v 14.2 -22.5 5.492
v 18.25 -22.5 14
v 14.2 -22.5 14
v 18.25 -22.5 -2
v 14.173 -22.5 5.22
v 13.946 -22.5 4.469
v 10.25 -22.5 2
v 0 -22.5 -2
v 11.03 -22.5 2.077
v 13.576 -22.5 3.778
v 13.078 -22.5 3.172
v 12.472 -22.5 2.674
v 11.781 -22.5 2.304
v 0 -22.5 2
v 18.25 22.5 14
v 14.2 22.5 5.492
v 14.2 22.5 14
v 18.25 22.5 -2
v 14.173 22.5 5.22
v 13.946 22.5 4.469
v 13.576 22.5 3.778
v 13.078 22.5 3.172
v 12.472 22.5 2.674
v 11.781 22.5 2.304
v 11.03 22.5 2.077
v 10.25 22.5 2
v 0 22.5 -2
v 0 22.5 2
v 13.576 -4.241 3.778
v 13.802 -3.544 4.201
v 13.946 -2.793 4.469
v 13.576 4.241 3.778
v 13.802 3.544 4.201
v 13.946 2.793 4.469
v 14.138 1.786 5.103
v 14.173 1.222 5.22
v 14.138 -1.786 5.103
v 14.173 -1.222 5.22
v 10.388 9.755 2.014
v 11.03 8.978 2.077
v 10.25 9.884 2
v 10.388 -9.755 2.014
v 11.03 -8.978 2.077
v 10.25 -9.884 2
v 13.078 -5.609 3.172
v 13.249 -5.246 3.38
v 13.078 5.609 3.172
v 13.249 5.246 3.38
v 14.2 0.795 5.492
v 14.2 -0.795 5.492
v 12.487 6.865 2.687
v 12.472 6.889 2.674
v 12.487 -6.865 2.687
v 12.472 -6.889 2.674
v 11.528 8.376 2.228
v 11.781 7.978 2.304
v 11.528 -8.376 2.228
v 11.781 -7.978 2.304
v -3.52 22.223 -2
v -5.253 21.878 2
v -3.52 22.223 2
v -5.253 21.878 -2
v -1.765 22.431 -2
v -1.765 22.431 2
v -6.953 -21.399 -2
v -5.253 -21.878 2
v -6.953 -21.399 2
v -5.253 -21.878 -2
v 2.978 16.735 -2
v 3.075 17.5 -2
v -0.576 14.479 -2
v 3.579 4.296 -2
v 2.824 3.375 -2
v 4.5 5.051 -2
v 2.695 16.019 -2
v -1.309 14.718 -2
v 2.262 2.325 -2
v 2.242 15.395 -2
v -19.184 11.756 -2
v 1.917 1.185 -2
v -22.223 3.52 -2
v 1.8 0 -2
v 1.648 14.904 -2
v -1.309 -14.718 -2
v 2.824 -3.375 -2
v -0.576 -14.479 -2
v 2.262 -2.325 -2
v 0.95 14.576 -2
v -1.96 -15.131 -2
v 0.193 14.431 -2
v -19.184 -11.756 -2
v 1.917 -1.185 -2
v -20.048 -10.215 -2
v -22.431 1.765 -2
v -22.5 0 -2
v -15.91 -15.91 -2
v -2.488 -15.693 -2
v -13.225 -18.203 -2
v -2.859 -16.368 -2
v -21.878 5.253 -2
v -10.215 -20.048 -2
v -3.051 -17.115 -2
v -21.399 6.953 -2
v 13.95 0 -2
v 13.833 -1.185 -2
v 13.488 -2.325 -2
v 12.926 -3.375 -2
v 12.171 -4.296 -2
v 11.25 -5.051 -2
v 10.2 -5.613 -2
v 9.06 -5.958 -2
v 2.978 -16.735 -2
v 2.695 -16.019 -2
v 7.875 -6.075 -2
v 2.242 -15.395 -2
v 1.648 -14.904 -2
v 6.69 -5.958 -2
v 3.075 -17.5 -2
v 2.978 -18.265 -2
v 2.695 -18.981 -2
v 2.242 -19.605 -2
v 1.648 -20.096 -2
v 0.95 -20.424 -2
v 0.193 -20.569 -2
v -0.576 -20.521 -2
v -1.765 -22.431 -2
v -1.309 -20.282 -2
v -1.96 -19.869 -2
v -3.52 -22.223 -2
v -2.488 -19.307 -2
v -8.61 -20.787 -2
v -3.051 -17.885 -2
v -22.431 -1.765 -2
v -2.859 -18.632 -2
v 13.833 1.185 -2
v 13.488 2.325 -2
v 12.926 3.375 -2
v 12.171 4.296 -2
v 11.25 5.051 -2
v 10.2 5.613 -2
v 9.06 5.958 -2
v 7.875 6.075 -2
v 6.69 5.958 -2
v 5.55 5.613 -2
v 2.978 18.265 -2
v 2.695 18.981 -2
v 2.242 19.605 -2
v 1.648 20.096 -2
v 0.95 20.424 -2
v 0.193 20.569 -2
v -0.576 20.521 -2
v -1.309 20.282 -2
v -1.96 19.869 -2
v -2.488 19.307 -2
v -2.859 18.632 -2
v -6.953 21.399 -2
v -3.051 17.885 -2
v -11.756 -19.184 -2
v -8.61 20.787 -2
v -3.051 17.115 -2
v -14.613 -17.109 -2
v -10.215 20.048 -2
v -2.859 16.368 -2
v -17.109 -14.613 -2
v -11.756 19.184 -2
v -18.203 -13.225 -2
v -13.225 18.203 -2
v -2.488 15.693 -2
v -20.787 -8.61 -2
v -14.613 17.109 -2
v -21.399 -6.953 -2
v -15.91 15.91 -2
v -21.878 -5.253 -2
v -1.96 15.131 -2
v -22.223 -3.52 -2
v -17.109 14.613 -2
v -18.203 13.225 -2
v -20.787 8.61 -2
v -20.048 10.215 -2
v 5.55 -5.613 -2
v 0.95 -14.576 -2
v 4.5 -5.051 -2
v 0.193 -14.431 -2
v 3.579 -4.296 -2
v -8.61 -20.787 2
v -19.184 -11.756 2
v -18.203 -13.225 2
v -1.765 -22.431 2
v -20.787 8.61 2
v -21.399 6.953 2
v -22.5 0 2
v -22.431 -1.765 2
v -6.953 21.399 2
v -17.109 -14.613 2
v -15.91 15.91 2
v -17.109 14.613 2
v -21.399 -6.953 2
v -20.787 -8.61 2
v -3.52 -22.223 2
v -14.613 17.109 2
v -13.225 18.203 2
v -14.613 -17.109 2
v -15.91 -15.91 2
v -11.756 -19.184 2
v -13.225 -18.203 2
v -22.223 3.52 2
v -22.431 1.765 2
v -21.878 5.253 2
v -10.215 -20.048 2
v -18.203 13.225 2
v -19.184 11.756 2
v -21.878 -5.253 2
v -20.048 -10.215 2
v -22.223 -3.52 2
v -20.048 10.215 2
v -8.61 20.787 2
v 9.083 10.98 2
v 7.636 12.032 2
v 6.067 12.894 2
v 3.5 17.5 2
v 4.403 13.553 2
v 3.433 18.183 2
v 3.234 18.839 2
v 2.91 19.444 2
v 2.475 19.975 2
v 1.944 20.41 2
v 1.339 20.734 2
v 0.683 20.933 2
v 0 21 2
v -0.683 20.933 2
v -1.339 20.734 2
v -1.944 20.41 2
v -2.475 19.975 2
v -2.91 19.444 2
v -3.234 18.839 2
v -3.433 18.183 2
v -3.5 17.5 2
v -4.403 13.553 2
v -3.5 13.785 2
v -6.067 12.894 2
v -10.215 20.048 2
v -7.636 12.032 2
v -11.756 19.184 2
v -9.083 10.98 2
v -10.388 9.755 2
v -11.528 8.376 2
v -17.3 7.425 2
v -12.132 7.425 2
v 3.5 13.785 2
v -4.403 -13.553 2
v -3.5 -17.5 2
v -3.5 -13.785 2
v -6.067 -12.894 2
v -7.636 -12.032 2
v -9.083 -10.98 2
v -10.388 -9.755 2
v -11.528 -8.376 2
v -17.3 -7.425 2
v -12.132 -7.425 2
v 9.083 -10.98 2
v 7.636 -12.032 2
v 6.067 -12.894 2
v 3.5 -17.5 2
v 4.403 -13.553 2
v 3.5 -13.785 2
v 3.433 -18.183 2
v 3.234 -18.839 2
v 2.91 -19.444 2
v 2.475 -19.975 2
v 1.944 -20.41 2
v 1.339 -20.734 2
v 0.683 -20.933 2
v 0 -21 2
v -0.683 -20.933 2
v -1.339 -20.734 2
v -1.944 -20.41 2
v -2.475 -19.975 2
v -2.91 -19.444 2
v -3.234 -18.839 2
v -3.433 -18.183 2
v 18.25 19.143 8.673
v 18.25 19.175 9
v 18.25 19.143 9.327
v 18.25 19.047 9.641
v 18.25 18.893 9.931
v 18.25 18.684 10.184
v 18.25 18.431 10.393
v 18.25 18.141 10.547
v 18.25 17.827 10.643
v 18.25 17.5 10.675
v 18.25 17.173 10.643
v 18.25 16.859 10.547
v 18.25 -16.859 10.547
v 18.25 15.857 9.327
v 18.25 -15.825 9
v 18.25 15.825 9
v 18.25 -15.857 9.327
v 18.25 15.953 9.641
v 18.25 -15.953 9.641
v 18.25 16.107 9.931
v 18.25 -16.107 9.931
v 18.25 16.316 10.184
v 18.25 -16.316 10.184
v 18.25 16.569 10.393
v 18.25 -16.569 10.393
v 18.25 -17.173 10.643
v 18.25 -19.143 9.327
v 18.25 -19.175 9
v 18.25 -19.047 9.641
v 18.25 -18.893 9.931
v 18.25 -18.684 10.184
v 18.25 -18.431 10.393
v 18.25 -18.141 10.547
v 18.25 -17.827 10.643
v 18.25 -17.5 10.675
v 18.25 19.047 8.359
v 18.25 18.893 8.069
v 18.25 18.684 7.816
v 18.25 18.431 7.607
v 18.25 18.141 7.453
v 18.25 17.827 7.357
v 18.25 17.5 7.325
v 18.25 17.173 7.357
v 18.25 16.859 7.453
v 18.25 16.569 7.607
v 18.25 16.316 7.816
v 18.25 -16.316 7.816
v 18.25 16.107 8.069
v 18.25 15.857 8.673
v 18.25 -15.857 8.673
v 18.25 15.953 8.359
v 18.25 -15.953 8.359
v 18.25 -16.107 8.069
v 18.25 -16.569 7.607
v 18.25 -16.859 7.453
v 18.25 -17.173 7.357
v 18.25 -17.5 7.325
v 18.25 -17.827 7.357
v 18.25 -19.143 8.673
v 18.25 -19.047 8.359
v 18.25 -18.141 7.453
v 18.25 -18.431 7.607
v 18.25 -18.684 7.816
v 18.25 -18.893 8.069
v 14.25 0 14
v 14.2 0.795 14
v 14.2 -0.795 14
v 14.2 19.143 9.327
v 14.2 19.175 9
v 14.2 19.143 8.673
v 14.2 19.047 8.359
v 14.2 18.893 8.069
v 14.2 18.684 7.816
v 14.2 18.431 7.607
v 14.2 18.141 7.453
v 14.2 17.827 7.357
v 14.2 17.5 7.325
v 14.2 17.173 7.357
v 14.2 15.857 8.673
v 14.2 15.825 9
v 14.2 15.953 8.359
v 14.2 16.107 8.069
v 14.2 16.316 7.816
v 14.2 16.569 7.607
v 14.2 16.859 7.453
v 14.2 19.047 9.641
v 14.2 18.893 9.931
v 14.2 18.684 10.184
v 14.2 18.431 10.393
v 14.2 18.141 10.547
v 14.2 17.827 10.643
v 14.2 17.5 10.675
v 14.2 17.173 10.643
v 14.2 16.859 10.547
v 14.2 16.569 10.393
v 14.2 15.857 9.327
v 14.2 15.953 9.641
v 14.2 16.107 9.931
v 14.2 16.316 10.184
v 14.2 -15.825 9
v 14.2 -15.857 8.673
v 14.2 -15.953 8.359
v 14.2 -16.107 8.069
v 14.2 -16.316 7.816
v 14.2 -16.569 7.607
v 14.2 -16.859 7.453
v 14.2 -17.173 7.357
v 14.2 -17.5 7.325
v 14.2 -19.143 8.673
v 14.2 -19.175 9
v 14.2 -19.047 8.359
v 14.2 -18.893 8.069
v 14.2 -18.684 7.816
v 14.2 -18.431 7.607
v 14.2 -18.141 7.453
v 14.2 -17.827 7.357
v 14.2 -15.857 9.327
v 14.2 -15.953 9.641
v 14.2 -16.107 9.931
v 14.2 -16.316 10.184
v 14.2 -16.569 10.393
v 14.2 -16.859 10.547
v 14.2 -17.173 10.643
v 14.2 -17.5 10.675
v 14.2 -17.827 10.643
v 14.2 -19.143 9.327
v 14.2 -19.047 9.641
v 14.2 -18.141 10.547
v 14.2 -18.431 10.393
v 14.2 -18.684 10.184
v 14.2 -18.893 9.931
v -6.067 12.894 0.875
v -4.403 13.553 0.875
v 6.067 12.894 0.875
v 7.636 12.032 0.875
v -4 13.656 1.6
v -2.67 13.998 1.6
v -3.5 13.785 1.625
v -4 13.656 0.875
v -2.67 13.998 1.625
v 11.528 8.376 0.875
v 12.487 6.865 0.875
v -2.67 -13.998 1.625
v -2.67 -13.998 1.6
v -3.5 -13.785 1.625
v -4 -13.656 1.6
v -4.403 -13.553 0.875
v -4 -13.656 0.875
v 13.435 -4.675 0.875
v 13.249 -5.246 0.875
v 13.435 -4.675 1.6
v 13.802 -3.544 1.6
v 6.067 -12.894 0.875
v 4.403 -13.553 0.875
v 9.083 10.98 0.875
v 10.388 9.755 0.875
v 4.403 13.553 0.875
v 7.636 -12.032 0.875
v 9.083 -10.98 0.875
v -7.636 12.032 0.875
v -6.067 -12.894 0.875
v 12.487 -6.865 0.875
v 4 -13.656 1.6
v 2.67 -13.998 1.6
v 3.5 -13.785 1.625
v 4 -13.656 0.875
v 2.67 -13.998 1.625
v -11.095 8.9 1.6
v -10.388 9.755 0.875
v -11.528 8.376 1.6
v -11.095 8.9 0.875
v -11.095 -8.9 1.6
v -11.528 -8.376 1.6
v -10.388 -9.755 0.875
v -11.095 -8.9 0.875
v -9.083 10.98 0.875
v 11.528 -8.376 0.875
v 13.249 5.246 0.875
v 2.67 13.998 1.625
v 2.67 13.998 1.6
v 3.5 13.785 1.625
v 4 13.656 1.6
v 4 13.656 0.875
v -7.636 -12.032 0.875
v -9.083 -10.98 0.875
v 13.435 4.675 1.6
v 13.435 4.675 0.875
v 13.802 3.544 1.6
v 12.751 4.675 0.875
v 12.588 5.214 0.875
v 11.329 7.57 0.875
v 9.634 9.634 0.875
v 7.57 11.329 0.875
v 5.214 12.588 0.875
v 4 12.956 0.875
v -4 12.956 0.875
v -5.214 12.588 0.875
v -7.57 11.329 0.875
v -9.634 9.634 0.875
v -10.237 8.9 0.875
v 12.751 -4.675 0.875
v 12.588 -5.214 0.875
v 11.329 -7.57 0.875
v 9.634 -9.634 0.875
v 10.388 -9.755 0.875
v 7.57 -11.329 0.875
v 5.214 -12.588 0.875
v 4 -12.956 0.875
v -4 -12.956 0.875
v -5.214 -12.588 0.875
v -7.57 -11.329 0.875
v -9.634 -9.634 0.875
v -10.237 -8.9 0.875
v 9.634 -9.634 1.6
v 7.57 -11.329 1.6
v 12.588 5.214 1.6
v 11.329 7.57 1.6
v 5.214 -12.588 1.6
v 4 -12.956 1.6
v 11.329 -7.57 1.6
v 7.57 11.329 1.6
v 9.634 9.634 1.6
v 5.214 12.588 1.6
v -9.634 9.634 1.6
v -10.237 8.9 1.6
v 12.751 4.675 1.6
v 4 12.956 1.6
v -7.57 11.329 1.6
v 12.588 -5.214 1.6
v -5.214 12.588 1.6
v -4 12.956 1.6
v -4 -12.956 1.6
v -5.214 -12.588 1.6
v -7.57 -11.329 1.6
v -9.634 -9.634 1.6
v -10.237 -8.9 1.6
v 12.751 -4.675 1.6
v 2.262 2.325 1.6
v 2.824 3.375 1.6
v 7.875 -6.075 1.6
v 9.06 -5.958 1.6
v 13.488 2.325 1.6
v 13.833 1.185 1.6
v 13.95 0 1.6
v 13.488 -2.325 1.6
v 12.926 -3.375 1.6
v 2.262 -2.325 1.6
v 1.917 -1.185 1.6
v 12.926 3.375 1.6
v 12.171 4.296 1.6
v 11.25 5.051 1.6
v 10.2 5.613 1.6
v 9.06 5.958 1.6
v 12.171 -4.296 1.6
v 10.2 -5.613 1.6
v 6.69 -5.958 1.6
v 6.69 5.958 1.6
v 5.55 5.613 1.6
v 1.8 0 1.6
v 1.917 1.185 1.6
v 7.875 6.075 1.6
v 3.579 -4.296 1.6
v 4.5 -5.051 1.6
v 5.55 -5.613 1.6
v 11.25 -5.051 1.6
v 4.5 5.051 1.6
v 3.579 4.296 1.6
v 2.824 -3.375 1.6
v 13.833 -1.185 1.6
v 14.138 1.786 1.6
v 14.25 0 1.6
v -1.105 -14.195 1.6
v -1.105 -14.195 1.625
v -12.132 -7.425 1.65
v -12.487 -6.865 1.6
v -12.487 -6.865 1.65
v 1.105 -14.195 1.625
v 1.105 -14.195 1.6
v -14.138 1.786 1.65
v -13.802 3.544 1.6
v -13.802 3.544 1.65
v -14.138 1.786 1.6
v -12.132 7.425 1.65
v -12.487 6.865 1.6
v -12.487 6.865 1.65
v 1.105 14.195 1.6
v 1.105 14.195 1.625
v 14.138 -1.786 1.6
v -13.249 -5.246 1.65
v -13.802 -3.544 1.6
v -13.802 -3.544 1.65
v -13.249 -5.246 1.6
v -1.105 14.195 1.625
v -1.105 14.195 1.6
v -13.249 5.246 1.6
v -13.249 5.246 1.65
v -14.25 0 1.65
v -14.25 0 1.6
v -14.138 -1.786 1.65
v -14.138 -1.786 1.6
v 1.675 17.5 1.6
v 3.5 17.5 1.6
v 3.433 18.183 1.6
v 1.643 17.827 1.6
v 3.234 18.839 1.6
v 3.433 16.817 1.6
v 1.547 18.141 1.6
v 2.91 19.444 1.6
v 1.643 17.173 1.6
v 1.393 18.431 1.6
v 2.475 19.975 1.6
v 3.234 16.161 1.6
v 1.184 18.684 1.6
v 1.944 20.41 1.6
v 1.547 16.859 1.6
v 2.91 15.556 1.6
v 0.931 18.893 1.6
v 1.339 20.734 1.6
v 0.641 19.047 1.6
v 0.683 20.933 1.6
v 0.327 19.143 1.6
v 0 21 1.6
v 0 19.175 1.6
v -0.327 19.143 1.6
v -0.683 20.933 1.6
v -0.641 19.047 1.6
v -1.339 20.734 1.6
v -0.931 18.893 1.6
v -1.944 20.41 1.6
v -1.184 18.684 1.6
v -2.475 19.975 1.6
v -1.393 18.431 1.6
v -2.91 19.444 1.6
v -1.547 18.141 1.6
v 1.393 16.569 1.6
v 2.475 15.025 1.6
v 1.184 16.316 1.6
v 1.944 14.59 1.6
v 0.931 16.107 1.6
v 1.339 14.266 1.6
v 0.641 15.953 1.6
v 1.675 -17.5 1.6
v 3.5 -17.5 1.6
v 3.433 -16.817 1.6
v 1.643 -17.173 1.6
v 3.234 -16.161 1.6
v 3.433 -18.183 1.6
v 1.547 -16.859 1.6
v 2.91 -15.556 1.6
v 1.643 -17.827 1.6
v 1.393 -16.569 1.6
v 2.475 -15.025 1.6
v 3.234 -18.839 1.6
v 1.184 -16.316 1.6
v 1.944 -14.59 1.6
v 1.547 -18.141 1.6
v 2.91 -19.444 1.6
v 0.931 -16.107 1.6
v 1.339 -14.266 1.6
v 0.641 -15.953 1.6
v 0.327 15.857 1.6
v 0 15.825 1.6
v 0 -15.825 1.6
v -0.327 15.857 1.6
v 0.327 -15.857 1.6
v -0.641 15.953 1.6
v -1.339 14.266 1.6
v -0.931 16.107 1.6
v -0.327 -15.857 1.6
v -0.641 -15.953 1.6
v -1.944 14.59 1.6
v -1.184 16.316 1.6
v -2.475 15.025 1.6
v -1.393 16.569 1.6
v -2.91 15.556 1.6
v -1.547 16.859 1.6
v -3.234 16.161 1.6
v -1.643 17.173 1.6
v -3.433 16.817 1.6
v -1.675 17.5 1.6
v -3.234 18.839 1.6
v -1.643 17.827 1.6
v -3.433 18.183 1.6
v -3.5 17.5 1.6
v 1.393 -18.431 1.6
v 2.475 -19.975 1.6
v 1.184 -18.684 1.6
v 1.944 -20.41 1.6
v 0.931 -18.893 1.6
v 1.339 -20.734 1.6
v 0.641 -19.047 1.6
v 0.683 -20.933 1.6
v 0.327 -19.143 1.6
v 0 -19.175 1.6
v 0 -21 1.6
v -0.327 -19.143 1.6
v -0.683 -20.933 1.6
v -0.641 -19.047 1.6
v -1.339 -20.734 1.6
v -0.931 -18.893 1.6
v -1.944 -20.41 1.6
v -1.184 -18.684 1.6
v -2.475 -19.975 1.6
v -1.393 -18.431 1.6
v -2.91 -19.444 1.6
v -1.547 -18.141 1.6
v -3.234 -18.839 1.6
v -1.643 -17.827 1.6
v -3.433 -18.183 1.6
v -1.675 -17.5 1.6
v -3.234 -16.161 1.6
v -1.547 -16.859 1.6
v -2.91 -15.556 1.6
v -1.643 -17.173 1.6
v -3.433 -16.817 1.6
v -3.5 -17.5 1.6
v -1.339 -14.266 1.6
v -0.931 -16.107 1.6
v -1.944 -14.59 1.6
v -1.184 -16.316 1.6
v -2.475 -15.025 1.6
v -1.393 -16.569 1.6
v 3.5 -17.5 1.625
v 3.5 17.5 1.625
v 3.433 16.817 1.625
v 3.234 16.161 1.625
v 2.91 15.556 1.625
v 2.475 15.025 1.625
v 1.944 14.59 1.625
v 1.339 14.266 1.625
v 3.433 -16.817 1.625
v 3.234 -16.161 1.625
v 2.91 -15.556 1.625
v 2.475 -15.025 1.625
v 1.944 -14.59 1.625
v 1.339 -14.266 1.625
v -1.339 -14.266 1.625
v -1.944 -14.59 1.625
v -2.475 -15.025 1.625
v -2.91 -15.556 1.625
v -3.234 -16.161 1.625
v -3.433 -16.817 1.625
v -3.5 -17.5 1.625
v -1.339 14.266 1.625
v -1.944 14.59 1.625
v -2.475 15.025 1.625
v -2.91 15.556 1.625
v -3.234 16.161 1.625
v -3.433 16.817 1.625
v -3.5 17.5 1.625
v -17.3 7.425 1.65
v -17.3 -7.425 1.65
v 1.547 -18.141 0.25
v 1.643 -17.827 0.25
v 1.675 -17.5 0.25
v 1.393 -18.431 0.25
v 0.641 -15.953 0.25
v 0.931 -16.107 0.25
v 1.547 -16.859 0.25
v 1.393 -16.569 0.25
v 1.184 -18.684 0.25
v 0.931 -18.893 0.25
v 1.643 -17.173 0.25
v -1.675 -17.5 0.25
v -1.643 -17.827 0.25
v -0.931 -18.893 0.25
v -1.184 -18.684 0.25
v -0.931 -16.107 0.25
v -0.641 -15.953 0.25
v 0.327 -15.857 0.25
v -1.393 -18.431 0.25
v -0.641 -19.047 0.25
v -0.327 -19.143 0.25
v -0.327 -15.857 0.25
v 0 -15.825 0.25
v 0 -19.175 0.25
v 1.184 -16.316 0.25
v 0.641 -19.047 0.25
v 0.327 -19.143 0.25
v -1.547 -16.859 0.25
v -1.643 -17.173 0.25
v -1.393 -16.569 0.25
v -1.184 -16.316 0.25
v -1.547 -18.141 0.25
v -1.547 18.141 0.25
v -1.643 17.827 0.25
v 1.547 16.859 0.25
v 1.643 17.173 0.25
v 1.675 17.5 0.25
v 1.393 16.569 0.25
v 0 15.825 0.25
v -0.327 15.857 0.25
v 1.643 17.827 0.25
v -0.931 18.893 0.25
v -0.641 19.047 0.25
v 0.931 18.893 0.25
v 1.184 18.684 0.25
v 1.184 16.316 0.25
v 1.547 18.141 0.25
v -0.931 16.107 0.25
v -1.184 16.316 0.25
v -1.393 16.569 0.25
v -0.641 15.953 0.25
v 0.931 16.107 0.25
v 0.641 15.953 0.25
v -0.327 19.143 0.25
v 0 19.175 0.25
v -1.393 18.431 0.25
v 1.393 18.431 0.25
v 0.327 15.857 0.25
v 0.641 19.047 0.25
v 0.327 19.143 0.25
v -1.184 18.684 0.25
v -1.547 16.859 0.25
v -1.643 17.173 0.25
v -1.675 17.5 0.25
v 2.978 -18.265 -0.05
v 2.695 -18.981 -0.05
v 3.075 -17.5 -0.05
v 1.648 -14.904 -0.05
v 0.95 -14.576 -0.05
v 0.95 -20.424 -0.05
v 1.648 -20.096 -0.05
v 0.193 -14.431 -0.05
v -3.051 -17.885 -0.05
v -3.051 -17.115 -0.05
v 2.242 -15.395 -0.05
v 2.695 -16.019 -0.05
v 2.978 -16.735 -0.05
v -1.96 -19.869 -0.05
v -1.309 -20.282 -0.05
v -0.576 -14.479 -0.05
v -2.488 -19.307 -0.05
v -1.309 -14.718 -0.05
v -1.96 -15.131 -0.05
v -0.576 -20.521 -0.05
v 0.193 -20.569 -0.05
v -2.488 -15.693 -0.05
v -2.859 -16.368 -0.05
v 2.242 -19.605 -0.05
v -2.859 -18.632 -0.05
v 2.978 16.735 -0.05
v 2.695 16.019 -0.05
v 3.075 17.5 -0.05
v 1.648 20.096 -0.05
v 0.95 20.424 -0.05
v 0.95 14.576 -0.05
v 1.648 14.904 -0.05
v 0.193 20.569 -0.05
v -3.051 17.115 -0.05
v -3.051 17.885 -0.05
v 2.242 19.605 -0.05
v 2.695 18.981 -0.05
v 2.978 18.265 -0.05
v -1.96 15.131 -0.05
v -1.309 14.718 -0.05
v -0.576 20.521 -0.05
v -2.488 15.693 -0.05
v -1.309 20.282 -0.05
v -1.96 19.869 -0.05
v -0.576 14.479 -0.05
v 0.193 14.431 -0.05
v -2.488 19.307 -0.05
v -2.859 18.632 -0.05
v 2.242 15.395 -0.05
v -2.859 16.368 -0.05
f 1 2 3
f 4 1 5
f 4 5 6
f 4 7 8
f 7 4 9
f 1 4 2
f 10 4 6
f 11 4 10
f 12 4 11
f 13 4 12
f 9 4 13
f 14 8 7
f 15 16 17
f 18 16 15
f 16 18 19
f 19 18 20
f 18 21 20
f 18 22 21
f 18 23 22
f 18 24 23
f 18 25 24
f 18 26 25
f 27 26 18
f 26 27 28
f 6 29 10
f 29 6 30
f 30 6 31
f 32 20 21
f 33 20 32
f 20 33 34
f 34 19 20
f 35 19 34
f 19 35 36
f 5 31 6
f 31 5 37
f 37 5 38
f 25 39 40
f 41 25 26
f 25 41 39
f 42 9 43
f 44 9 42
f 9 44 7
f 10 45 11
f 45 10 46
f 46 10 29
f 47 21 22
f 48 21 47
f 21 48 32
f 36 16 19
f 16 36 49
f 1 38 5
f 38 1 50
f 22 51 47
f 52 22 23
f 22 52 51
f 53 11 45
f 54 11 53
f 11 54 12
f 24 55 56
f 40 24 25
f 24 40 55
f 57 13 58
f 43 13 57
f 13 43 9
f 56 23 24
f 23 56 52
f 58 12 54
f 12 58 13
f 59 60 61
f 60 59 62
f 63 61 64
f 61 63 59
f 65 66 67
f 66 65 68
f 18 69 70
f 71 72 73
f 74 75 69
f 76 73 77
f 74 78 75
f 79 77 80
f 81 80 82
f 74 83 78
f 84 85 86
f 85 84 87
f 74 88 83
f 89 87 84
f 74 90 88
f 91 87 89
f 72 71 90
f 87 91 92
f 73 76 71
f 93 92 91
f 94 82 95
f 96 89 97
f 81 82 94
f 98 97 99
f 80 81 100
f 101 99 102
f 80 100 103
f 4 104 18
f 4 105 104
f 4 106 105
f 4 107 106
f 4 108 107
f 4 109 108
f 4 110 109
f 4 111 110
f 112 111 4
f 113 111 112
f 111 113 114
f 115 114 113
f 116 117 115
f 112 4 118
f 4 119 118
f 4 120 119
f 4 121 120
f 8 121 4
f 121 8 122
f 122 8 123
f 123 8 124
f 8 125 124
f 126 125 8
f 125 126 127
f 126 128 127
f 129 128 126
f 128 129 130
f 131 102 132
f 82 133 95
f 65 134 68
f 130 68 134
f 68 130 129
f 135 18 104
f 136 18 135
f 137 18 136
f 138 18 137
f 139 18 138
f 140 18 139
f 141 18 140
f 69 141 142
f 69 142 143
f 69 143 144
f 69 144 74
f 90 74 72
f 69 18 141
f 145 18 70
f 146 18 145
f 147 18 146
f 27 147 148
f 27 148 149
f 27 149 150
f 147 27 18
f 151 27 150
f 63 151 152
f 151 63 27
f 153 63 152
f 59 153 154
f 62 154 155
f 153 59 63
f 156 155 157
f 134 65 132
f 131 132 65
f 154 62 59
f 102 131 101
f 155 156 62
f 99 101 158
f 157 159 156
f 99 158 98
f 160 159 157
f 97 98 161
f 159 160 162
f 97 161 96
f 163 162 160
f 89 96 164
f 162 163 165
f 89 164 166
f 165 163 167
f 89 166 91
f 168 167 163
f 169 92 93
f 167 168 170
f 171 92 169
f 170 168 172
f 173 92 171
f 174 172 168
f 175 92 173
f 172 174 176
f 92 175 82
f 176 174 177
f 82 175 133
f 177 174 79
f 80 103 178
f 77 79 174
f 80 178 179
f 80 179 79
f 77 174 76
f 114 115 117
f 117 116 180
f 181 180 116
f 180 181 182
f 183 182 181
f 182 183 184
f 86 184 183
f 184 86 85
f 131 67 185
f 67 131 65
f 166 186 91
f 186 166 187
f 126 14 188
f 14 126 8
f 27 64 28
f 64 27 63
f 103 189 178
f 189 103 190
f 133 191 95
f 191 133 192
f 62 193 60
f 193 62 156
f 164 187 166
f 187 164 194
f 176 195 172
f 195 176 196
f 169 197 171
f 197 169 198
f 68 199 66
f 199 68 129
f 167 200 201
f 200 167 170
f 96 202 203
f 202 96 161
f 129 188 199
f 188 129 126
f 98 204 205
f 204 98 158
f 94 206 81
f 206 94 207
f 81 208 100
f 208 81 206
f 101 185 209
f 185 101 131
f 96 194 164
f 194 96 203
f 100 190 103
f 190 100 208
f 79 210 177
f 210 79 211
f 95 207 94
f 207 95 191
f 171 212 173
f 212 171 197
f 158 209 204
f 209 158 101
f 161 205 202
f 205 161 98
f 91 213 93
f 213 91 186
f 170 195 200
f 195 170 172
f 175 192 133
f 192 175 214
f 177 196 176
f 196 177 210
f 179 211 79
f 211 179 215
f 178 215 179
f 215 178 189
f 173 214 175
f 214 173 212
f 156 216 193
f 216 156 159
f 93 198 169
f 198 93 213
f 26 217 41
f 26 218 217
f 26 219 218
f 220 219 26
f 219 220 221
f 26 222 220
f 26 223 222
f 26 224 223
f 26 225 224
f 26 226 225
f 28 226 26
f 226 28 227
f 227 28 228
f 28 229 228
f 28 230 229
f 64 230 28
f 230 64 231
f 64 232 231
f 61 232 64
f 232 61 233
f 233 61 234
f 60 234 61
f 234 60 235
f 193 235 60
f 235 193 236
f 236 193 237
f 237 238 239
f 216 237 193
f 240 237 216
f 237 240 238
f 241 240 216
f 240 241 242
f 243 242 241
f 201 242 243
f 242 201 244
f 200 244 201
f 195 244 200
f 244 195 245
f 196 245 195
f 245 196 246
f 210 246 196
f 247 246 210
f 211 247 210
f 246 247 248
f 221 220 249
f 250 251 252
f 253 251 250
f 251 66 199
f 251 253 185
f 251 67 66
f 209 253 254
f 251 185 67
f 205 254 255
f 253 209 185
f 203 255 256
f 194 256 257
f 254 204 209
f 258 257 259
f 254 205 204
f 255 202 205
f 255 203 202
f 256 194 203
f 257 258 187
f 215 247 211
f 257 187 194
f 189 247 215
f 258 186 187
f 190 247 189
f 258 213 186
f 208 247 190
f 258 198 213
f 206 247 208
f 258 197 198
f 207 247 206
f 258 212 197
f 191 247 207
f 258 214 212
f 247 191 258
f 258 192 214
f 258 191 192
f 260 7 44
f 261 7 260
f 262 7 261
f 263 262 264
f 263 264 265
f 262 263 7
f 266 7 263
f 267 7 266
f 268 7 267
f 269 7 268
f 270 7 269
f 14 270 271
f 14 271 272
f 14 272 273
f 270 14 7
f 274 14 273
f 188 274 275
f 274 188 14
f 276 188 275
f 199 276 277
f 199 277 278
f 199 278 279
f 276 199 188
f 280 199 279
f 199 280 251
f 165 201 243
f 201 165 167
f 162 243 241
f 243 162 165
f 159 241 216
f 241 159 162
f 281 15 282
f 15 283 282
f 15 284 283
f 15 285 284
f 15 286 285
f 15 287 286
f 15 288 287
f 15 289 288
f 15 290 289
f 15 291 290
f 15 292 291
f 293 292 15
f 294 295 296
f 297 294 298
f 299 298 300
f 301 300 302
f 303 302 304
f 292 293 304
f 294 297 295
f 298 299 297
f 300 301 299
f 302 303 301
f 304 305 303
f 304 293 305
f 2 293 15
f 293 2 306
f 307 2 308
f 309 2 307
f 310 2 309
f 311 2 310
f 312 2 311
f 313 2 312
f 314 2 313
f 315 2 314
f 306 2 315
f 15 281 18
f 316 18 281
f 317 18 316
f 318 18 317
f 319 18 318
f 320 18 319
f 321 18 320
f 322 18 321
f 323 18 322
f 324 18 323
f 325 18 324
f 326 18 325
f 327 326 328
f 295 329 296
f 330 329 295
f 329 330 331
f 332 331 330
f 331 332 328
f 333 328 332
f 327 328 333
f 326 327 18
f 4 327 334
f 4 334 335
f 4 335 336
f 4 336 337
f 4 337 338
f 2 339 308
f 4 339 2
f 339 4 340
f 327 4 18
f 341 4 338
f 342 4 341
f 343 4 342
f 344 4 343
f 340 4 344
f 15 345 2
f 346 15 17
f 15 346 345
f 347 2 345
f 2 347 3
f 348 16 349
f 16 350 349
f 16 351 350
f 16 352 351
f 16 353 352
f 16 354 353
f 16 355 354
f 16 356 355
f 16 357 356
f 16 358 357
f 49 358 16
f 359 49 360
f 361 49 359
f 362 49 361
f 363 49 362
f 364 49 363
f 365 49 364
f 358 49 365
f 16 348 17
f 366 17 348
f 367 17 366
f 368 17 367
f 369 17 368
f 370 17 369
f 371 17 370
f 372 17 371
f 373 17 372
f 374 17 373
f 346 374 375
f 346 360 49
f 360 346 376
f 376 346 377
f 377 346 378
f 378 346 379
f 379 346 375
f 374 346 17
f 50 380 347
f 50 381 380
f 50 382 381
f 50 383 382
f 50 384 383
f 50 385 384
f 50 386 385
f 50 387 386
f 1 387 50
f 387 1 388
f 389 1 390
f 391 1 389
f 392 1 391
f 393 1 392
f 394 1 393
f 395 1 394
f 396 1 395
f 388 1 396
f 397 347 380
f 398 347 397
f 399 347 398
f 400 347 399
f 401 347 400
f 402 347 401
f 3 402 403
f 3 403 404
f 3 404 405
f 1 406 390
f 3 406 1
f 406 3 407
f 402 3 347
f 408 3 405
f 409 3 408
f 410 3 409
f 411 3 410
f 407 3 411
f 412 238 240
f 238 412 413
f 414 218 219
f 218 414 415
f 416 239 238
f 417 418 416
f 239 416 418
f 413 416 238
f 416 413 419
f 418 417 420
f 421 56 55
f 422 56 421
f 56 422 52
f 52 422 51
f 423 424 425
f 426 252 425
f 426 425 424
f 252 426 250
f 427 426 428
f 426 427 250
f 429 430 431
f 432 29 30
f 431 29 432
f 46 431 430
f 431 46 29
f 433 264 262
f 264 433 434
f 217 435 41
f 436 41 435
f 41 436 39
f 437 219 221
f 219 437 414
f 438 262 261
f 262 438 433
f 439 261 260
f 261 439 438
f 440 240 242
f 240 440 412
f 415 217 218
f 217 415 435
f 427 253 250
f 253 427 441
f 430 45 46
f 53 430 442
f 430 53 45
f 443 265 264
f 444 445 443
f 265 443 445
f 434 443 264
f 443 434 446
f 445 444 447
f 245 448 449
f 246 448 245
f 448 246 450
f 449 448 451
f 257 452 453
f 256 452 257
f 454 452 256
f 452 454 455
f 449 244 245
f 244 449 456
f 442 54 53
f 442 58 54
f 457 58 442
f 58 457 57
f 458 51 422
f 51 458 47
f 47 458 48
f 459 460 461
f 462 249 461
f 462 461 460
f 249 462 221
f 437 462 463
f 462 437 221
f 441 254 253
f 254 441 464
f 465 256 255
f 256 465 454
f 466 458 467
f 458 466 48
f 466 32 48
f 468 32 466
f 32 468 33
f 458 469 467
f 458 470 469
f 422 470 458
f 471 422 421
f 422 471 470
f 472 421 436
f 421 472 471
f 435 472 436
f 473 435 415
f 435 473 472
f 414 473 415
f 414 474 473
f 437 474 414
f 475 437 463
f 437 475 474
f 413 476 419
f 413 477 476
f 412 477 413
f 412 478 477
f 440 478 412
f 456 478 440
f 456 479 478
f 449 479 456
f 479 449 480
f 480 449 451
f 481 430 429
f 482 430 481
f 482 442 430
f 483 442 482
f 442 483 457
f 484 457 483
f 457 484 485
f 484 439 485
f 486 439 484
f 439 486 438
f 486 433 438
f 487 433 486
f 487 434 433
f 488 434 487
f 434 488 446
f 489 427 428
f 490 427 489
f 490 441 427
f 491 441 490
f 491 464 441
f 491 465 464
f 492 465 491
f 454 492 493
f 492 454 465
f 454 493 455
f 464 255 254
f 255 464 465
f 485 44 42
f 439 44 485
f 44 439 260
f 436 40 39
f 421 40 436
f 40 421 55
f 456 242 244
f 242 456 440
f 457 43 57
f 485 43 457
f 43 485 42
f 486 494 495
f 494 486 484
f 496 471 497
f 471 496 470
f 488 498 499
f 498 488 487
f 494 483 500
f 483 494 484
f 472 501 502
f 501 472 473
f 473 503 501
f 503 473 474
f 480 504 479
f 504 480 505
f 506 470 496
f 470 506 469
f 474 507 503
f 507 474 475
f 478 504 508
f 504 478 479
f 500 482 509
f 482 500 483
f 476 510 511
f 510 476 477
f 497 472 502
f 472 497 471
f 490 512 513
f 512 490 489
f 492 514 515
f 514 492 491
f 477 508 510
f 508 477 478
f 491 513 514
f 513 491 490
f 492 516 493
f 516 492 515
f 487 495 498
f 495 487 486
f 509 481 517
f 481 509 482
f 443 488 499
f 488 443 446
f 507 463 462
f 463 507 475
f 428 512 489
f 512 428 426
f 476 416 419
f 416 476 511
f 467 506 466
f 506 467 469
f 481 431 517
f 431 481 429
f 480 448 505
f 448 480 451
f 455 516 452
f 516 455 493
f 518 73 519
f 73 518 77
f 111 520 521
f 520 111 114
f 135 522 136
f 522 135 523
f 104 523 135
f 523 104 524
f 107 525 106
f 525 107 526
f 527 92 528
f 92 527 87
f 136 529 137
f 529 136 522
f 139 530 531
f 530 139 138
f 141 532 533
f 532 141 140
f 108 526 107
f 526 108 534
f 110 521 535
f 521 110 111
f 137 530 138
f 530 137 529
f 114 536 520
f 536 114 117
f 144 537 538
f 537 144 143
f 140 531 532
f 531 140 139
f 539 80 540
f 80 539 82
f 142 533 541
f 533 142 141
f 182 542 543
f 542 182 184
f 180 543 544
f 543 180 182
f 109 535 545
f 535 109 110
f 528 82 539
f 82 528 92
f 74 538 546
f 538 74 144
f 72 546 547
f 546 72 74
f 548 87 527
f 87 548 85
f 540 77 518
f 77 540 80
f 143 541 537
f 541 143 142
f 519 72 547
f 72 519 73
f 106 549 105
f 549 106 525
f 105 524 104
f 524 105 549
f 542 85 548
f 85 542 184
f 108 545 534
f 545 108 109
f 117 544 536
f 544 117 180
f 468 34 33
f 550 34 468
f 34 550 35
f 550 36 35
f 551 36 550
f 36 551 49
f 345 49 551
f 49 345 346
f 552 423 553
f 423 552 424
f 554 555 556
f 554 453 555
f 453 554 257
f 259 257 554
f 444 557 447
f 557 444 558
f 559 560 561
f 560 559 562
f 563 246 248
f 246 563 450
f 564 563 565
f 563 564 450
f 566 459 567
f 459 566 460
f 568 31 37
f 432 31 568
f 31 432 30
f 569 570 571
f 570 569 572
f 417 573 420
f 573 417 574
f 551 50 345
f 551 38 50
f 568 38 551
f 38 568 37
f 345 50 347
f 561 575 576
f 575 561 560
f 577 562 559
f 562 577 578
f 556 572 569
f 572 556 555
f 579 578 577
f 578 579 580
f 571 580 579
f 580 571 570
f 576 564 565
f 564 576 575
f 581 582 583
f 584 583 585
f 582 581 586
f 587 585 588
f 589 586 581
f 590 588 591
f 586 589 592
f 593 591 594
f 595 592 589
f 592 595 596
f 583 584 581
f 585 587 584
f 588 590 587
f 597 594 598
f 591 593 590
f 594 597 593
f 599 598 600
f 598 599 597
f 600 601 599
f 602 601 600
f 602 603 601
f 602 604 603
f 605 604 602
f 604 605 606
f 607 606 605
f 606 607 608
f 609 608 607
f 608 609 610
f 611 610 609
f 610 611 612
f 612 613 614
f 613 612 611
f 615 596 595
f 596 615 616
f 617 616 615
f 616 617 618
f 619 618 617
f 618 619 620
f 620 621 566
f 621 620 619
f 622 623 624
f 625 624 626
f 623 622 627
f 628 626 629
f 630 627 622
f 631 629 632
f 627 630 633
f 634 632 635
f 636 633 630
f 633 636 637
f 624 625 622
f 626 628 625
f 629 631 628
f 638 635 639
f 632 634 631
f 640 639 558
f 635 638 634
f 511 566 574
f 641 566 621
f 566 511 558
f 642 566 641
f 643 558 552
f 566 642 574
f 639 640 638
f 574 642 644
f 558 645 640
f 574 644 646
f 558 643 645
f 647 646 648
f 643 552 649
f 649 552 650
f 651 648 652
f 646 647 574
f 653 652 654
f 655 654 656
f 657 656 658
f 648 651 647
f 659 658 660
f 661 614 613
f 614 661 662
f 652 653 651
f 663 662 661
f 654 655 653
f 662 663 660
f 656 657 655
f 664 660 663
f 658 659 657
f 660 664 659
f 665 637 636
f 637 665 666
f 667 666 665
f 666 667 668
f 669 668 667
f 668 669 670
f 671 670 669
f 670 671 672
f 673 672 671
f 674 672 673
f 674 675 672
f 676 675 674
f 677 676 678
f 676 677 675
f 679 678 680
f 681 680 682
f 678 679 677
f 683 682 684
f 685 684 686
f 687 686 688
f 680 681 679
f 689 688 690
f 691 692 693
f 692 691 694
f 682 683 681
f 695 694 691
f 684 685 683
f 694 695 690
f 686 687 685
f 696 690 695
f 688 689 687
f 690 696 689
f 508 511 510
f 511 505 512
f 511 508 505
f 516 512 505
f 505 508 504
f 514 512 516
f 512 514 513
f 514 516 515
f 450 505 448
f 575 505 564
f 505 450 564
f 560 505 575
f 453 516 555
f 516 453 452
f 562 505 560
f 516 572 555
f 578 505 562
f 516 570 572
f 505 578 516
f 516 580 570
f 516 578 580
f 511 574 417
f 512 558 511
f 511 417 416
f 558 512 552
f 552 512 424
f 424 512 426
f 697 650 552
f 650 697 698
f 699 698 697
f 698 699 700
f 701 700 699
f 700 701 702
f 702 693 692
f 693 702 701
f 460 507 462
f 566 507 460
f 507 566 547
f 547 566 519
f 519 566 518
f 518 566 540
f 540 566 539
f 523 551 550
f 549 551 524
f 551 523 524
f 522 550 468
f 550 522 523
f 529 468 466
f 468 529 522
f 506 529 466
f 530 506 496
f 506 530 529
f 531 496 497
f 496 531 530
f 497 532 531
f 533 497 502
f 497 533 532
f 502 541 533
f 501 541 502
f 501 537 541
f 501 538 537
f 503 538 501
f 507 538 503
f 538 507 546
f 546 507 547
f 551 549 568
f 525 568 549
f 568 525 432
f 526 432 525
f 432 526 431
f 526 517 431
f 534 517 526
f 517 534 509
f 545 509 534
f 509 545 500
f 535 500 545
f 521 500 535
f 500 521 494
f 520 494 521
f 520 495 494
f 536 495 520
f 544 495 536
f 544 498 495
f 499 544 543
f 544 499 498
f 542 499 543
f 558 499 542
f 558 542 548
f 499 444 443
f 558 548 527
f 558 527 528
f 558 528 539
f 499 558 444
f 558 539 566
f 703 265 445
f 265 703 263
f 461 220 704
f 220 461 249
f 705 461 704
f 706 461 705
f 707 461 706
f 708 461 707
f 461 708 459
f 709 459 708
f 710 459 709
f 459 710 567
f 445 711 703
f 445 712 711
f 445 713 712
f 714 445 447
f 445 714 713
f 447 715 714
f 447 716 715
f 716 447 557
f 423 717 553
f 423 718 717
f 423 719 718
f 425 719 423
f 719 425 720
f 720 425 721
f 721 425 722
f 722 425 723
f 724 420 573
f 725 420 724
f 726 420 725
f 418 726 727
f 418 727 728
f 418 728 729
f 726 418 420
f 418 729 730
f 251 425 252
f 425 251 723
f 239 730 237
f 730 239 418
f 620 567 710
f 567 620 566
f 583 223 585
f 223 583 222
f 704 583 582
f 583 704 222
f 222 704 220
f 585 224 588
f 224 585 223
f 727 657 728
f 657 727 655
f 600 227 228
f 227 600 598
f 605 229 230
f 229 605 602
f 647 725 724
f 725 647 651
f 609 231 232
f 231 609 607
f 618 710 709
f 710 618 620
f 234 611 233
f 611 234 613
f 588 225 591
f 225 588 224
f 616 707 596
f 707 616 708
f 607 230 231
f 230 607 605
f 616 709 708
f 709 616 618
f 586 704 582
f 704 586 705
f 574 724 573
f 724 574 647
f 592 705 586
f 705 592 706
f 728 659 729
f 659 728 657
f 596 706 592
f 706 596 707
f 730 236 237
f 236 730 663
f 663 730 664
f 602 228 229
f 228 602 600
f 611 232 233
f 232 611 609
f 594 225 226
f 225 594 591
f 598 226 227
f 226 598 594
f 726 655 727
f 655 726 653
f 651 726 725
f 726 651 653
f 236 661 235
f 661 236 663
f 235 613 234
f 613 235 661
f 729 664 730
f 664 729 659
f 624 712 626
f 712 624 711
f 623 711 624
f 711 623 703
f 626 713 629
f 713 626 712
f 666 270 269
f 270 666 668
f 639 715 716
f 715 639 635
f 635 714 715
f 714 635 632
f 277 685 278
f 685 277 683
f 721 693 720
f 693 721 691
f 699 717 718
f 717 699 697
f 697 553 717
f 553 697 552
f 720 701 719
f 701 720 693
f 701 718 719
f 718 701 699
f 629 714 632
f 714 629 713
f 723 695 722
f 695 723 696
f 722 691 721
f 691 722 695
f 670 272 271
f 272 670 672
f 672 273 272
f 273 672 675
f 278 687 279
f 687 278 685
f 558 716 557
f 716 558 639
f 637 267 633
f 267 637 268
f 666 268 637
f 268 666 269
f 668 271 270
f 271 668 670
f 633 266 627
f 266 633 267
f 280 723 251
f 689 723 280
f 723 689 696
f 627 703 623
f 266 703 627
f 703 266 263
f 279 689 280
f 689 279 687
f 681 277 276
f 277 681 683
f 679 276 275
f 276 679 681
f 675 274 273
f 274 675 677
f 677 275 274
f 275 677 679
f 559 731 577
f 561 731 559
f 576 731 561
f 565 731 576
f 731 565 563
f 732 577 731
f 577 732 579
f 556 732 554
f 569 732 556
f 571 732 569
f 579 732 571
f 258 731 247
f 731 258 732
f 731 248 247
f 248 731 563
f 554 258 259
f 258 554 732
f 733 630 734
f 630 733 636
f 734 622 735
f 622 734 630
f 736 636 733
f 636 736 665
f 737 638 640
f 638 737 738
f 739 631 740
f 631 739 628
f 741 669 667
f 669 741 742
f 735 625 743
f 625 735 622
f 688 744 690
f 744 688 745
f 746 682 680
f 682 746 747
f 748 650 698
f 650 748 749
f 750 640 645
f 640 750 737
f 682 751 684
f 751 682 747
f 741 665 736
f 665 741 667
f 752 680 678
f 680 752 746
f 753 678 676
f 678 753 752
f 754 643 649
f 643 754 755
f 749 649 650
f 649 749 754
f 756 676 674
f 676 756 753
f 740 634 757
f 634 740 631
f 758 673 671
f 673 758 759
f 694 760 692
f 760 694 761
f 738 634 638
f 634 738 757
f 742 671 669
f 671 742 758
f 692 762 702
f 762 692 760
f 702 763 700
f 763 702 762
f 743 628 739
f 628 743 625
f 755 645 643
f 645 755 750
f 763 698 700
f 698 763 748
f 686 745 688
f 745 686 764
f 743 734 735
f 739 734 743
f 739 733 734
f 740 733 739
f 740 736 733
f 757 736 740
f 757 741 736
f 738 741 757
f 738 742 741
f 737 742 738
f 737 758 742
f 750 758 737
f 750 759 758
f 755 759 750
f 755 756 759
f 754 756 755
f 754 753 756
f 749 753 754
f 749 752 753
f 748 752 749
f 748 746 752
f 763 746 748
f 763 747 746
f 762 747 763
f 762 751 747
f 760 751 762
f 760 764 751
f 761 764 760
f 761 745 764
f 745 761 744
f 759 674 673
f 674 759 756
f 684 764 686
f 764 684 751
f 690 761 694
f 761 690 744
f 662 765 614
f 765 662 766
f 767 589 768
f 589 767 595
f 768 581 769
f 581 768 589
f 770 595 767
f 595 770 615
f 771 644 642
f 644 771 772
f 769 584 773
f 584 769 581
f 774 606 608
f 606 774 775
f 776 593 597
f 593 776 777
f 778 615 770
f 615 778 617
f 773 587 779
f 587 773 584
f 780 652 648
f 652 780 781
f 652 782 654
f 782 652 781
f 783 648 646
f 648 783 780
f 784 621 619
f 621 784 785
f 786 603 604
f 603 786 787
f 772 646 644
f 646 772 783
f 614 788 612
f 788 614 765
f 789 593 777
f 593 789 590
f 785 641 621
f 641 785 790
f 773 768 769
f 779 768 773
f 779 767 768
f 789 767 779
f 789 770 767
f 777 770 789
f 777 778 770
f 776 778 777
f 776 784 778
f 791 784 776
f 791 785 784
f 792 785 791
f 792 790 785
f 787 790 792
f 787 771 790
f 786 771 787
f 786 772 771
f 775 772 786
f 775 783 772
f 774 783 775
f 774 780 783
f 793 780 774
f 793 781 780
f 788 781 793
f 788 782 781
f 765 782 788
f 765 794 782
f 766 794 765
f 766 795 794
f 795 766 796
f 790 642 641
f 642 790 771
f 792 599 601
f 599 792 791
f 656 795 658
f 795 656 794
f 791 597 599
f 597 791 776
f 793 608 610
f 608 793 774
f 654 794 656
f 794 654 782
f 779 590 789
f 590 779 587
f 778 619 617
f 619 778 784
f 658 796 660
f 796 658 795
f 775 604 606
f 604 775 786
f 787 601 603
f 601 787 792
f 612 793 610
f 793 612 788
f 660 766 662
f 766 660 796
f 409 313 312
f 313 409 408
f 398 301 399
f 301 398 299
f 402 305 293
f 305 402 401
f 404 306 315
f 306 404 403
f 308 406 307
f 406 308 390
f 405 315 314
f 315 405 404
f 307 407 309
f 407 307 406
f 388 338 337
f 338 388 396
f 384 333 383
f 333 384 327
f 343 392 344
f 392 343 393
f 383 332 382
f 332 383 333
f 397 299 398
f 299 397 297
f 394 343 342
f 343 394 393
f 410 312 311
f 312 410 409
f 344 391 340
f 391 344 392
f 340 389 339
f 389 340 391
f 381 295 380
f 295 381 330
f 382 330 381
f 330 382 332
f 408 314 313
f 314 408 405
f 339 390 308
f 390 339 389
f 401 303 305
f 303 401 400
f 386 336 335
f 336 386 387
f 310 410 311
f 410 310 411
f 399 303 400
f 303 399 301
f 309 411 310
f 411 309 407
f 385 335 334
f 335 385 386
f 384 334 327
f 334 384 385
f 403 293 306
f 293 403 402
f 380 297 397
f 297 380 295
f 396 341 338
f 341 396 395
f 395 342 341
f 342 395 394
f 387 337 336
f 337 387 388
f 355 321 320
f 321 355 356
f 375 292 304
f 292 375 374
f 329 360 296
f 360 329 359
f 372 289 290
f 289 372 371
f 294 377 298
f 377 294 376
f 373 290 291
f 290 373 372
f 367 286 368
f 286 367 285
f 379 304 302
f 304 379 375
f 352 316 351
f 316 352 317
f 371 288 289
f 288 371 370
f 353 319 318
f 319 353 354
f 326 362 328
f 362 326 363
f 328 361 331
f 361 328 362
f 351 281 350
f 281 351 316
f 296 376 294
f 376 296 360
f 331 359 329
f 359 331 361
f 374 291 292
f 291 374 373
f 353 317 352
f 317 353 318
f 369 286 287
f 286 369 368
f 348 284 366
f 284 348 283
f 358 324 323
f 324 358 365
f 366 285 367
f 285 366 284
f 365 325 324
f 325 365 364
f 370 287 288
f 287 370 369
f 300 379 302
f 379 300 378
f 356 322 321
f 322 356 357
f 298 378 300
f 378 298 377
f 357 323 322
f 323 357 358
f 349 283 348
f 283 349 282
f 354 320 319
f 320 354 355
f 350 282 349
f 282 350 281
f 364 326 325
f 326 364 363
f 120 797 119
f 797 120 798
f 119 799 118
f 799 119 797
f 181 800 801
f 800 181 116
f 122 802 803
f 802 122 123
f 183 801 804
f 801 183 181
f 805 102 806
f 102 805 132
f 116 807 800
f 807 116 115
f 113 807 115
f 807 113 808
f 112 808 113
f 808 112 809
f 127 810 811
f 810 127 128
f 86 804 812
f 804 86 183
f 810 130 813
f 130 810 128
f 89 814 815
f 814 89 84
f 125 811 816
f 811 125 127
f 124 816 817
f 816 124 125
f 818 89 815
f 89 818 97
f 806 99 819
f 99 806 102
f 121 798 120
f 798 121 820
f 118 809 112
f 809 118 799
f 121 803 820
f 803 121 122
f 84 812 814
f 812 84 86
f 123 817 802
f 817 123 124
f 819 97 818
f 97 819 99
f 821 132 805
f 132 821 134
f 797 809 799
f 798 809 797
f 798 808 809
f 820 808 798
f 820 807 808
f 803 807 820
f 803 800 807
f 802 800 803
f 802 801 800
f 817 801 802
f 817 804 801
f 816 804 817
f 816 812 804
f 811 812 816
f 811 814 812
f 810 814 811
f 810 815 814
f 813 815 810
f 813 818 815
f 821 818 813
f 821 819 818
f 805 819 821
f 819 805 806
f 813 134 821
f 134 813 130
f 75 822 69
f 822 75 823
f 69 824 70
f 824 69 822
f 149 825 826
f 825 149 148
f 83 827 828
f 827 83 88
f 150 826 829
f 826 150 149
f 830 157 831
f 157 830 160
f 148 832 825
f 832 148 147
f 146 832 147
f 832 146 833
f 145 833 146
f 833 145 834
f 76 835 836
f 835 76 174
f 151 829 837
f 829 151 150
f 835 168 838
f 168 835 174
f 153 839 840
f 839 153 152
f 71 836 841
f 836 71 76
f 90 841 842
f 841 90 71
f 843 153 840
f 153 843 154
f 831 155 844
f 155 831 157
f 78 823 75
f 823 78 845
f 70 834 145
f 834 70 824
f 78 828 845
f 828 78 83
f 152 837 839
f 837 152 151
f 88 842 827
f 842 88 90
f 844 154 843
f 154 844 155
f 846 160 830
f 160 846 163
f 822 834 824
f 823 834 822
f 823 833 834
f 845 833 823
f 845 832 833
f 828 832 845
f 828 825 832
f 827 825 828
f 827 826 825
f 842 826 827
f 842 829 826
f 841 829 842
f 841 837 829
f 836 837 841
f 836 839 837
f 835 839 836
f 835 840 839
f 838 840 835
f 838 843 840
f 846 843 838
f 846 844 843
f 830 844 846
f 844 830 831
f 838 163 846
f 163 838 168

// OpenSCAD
// Bracket for  28BYJ-48 stepper motor
// 28BYJ-48 model from RGriffoGoes www.thingiverse.com/thing:204734
// added details by J.Beale 21 July 2014
// Bracket by J.Beale 9 Aug 2014

slop = 0.25;  // printer tolerance
layer = 0.25; // layer height

// =========================================================
// stepper motor body model

MBH = 18.8;   // motor body height
MBD = 28.25+slop;  // motor body OD
SBD = 9.1+slop;    // shaft boss OD
SBH = 1.45;   // shaft boss height above motor body
SBO = 7.875;  // offset of shaft/boss center from motor center
//SHD = 4.93+slop*2;   // motor shaft OD+ countersink for boss
SHD = 11.9+slop;   // motor shaft OD (larger clearance hole)
SHDF = 3.0;   // motor shaft diameter, across flats
SHHF = 6.0;   // motor shaft flats height, or depth in from end
SHHF = 0.0;   // assume round shaft for purposes of bracket
SHH = 9.75;   // height of shaft above motor body 

MBFH = 0.7;   // height of body edge flange protruding above surface
MBFW = 1.0+slop;   // width of edge flange
MBFNW = 8;    // width of notch in edge flange
MBFNW2 = 17.8;  // width of edge flange notch above wiring box

MHCC = 35.0;  // mounting hole center-to-center
MTH  = 0.8;   // mounting tab thickness
MTW  = 7.0;   // mounting tab width
// MTHID = 4.0;  // mounting tab hole inner diameter
MTHID = 3.0;  // mounting tab hole inner diameter
WBH  = 16.7;  // plastic wiring box height
WBW  = 14.6+slop;  // plastic wiring box width
WBD  = 31.3+slop;  // body diameter to outer surface of wiring box

WRD = 1.0;     // diameter of electrical wires
WRL = 30;      // length of electrical wires
WRO = 2.2;		// offset of wires below top motor surface
// =========================================================
// right-angle bracket for motor

MSOD = 5.9 + slop;  // M3 mounting screw head diameter
MSTH = 2.0;  // M3 screw head thickness (for countersink)
//MSTH = 0; // set to zero for no screwhead countersink
MSSD = 3.1 + slop;  // M3 screw diameter clearance hole
Bthick = 4;  // thickness of bracket
Bdia = (MHCC+10);  // diameter of bracket face

// =========================================================
fn = 80;
eps = 0.05;   // small number to avoid coincident faces


module StepMotor28BYJ()
{
  difference(){
    union(){
	   color("gray") translate([0,0,-(MBH+MBFH)/2])
		  difference() {  // flange at top rim
         cylinder(h = MBFH+eps, r = MBD/2, center = true, $fn = 50);
         cylinder(h = MBFH+2*eps, r = (MBD-MBFW)/2, center = true, $fn = 32);
			cube([MBFNW,MHCC,MBFH*2],center=true); // notches in rim
			cube([MBD+2*MBFW,SBD,MBFH*2],center=true);
		   translate([-MBD/2,0,0]) cube([MBD,MBFNW2,MBFH*2],center=true);
        }
		color("gray") // motor body
			cylinder(h = MBH, r = MBD/2, center = true, $fn = 50);
		color("gray") translate([SBO,0,-SBH])	// shaft boss
			cylinder(h = MBH, r = SBD/2, center = true, $fn = 32);

		translate([SBO,0,-SHH])	// motor shaft
        difference() {
			color("gold") cylinder(h = MBH, r = SHD/2, center = true, $fn = 32);
				// shaft flats
		   color("red") translate([(SHD+SHDF)/2,0,-(eps+MBH-SHHF)/2]) 
				cube([SHD,SHD,SHHF], center = true);
		   color("red") translate([-(SHD+SHDF)/2,0,-(eps+MBH-SHHF)/2]) 
				cube([SHD,SHD,SHHF], center = true);
        }


		color("Silver") translate([0,0,-(MBH-MTH-eps)/2]) // mounting tab 
			cube([MTW,MHCC,MTH], center = true);				
		color("Silver") translate([0,MHCC/2,-(MBH-MTH)/2]) // mt.tab rounded end
			cylinder(h = MTH, r = MTW/2, center = true, $fn = 32);
		color("Silver") translate([0,-MHCC/2,-(MBH-MTH)/2]) // mt.tab rounded end
			cylinder(h = MTH, r = MTW/2, center = true, $fn = 32);


		color("blue") translate([-(WBD-MBD),0,eps-(MBH-WBH)/2]) // plastic wire box
			cube([MBD,WBW,WBH], center = true);
	   color("blue") translate([-2,0,0])	
			cube([24.5,16,15], center = true);
		}

				// mounting holes in tabs on side
		color("red") translate([0,MHCC/2,-MBH/2])	
				cylinder(h = 2, r = MTHID/2, center = true, $fn = 32);
		color("red") translate([0,-MHCC/2,-MBH/2])	
				cylinder(h = 2, r = MTHID/2, center = true, $fn = 32);
		}
}

module MOT() {
 translate([0,0,-MBH/2]) 
 rotate([180,0,0]) StepMotor28BYJ();  // motor body (without wires)
}


module bracket() {
difference() {
 union() {
  translate([0,0,-2]) cylinder(h=Bthick, r=Bdia/2, $fn=fn);  // round face
  translate([-eps + MBD/2,-Bdia/2,-16+Bthick/2]) 
		cube([4+eps,Bdia,16]); // flange
  translate([-0,-Bdia/2,-Bthick/2]) 
	cube([Bdia,Bdia,Bthick]); // square edge joining round face to flange
  translate([MBD/2,Bdia/2,-Bthick/2]) rotate([90,0,0]) {
	difference(){cylinder(r=Bthick,h=Bdia,$fn=32); // round fillet at flange
   translate([-Bthick,-Bthick,0])cylinder(r=Bthick,h=Bdia,$fn=32); // round fillet at flange
}
}
 }
 union() {
   translate([4+MBD/2,-MBD,-MBD]) cube([MBD*2,MBD*2,MBD*2]);
   translate([0,MHCC/2,-15-layer])	// motor mounting bolt
				cylinder(h = 30, r = MSSD/2, center = true, $fn = 32);
   translate([0,-MHCC/2,-15-layer])	// motor mounting bole
				cylinder(h = 30, r = MSSD/2, center = true, $fn = 32);
   translate([10,MHCC/2,-10+1]) rotate([0,90,0]) 	// flange mounting bolt
				cylinder(h = 30, r = MSSD/2, center = true, $fn = 32);
   translate([10,-MHCC/2,-10+1]) rotate([0,90,0]) 	// flange mounting bolt
				cylinder(h = 30, r = MSSD/2, center = true, $fn = 32);

   color("white") translate([0,MHCC/2,((Bthick/2) - MSTH + eps)]) 
	 cylinder(r=MSOD/2, h=MSTH, $fn=25); // motor screw countersink
   color("white") translate([0,-MHCC/2,((Bthick/2) - MSTH + eps)])  
	 cylinder(r=MSOD/2, h=MSTH, $fn=25); // motor screw countersink

   translate([0,0,-1.6]) MOT(); // body of motor
   //translate([0,0,-10]) cube([50,50,50]); // DEBUG cutaway view
 }
}
} // end module()

rotate([180,0,0]) bracket();  // show the motor bracket
